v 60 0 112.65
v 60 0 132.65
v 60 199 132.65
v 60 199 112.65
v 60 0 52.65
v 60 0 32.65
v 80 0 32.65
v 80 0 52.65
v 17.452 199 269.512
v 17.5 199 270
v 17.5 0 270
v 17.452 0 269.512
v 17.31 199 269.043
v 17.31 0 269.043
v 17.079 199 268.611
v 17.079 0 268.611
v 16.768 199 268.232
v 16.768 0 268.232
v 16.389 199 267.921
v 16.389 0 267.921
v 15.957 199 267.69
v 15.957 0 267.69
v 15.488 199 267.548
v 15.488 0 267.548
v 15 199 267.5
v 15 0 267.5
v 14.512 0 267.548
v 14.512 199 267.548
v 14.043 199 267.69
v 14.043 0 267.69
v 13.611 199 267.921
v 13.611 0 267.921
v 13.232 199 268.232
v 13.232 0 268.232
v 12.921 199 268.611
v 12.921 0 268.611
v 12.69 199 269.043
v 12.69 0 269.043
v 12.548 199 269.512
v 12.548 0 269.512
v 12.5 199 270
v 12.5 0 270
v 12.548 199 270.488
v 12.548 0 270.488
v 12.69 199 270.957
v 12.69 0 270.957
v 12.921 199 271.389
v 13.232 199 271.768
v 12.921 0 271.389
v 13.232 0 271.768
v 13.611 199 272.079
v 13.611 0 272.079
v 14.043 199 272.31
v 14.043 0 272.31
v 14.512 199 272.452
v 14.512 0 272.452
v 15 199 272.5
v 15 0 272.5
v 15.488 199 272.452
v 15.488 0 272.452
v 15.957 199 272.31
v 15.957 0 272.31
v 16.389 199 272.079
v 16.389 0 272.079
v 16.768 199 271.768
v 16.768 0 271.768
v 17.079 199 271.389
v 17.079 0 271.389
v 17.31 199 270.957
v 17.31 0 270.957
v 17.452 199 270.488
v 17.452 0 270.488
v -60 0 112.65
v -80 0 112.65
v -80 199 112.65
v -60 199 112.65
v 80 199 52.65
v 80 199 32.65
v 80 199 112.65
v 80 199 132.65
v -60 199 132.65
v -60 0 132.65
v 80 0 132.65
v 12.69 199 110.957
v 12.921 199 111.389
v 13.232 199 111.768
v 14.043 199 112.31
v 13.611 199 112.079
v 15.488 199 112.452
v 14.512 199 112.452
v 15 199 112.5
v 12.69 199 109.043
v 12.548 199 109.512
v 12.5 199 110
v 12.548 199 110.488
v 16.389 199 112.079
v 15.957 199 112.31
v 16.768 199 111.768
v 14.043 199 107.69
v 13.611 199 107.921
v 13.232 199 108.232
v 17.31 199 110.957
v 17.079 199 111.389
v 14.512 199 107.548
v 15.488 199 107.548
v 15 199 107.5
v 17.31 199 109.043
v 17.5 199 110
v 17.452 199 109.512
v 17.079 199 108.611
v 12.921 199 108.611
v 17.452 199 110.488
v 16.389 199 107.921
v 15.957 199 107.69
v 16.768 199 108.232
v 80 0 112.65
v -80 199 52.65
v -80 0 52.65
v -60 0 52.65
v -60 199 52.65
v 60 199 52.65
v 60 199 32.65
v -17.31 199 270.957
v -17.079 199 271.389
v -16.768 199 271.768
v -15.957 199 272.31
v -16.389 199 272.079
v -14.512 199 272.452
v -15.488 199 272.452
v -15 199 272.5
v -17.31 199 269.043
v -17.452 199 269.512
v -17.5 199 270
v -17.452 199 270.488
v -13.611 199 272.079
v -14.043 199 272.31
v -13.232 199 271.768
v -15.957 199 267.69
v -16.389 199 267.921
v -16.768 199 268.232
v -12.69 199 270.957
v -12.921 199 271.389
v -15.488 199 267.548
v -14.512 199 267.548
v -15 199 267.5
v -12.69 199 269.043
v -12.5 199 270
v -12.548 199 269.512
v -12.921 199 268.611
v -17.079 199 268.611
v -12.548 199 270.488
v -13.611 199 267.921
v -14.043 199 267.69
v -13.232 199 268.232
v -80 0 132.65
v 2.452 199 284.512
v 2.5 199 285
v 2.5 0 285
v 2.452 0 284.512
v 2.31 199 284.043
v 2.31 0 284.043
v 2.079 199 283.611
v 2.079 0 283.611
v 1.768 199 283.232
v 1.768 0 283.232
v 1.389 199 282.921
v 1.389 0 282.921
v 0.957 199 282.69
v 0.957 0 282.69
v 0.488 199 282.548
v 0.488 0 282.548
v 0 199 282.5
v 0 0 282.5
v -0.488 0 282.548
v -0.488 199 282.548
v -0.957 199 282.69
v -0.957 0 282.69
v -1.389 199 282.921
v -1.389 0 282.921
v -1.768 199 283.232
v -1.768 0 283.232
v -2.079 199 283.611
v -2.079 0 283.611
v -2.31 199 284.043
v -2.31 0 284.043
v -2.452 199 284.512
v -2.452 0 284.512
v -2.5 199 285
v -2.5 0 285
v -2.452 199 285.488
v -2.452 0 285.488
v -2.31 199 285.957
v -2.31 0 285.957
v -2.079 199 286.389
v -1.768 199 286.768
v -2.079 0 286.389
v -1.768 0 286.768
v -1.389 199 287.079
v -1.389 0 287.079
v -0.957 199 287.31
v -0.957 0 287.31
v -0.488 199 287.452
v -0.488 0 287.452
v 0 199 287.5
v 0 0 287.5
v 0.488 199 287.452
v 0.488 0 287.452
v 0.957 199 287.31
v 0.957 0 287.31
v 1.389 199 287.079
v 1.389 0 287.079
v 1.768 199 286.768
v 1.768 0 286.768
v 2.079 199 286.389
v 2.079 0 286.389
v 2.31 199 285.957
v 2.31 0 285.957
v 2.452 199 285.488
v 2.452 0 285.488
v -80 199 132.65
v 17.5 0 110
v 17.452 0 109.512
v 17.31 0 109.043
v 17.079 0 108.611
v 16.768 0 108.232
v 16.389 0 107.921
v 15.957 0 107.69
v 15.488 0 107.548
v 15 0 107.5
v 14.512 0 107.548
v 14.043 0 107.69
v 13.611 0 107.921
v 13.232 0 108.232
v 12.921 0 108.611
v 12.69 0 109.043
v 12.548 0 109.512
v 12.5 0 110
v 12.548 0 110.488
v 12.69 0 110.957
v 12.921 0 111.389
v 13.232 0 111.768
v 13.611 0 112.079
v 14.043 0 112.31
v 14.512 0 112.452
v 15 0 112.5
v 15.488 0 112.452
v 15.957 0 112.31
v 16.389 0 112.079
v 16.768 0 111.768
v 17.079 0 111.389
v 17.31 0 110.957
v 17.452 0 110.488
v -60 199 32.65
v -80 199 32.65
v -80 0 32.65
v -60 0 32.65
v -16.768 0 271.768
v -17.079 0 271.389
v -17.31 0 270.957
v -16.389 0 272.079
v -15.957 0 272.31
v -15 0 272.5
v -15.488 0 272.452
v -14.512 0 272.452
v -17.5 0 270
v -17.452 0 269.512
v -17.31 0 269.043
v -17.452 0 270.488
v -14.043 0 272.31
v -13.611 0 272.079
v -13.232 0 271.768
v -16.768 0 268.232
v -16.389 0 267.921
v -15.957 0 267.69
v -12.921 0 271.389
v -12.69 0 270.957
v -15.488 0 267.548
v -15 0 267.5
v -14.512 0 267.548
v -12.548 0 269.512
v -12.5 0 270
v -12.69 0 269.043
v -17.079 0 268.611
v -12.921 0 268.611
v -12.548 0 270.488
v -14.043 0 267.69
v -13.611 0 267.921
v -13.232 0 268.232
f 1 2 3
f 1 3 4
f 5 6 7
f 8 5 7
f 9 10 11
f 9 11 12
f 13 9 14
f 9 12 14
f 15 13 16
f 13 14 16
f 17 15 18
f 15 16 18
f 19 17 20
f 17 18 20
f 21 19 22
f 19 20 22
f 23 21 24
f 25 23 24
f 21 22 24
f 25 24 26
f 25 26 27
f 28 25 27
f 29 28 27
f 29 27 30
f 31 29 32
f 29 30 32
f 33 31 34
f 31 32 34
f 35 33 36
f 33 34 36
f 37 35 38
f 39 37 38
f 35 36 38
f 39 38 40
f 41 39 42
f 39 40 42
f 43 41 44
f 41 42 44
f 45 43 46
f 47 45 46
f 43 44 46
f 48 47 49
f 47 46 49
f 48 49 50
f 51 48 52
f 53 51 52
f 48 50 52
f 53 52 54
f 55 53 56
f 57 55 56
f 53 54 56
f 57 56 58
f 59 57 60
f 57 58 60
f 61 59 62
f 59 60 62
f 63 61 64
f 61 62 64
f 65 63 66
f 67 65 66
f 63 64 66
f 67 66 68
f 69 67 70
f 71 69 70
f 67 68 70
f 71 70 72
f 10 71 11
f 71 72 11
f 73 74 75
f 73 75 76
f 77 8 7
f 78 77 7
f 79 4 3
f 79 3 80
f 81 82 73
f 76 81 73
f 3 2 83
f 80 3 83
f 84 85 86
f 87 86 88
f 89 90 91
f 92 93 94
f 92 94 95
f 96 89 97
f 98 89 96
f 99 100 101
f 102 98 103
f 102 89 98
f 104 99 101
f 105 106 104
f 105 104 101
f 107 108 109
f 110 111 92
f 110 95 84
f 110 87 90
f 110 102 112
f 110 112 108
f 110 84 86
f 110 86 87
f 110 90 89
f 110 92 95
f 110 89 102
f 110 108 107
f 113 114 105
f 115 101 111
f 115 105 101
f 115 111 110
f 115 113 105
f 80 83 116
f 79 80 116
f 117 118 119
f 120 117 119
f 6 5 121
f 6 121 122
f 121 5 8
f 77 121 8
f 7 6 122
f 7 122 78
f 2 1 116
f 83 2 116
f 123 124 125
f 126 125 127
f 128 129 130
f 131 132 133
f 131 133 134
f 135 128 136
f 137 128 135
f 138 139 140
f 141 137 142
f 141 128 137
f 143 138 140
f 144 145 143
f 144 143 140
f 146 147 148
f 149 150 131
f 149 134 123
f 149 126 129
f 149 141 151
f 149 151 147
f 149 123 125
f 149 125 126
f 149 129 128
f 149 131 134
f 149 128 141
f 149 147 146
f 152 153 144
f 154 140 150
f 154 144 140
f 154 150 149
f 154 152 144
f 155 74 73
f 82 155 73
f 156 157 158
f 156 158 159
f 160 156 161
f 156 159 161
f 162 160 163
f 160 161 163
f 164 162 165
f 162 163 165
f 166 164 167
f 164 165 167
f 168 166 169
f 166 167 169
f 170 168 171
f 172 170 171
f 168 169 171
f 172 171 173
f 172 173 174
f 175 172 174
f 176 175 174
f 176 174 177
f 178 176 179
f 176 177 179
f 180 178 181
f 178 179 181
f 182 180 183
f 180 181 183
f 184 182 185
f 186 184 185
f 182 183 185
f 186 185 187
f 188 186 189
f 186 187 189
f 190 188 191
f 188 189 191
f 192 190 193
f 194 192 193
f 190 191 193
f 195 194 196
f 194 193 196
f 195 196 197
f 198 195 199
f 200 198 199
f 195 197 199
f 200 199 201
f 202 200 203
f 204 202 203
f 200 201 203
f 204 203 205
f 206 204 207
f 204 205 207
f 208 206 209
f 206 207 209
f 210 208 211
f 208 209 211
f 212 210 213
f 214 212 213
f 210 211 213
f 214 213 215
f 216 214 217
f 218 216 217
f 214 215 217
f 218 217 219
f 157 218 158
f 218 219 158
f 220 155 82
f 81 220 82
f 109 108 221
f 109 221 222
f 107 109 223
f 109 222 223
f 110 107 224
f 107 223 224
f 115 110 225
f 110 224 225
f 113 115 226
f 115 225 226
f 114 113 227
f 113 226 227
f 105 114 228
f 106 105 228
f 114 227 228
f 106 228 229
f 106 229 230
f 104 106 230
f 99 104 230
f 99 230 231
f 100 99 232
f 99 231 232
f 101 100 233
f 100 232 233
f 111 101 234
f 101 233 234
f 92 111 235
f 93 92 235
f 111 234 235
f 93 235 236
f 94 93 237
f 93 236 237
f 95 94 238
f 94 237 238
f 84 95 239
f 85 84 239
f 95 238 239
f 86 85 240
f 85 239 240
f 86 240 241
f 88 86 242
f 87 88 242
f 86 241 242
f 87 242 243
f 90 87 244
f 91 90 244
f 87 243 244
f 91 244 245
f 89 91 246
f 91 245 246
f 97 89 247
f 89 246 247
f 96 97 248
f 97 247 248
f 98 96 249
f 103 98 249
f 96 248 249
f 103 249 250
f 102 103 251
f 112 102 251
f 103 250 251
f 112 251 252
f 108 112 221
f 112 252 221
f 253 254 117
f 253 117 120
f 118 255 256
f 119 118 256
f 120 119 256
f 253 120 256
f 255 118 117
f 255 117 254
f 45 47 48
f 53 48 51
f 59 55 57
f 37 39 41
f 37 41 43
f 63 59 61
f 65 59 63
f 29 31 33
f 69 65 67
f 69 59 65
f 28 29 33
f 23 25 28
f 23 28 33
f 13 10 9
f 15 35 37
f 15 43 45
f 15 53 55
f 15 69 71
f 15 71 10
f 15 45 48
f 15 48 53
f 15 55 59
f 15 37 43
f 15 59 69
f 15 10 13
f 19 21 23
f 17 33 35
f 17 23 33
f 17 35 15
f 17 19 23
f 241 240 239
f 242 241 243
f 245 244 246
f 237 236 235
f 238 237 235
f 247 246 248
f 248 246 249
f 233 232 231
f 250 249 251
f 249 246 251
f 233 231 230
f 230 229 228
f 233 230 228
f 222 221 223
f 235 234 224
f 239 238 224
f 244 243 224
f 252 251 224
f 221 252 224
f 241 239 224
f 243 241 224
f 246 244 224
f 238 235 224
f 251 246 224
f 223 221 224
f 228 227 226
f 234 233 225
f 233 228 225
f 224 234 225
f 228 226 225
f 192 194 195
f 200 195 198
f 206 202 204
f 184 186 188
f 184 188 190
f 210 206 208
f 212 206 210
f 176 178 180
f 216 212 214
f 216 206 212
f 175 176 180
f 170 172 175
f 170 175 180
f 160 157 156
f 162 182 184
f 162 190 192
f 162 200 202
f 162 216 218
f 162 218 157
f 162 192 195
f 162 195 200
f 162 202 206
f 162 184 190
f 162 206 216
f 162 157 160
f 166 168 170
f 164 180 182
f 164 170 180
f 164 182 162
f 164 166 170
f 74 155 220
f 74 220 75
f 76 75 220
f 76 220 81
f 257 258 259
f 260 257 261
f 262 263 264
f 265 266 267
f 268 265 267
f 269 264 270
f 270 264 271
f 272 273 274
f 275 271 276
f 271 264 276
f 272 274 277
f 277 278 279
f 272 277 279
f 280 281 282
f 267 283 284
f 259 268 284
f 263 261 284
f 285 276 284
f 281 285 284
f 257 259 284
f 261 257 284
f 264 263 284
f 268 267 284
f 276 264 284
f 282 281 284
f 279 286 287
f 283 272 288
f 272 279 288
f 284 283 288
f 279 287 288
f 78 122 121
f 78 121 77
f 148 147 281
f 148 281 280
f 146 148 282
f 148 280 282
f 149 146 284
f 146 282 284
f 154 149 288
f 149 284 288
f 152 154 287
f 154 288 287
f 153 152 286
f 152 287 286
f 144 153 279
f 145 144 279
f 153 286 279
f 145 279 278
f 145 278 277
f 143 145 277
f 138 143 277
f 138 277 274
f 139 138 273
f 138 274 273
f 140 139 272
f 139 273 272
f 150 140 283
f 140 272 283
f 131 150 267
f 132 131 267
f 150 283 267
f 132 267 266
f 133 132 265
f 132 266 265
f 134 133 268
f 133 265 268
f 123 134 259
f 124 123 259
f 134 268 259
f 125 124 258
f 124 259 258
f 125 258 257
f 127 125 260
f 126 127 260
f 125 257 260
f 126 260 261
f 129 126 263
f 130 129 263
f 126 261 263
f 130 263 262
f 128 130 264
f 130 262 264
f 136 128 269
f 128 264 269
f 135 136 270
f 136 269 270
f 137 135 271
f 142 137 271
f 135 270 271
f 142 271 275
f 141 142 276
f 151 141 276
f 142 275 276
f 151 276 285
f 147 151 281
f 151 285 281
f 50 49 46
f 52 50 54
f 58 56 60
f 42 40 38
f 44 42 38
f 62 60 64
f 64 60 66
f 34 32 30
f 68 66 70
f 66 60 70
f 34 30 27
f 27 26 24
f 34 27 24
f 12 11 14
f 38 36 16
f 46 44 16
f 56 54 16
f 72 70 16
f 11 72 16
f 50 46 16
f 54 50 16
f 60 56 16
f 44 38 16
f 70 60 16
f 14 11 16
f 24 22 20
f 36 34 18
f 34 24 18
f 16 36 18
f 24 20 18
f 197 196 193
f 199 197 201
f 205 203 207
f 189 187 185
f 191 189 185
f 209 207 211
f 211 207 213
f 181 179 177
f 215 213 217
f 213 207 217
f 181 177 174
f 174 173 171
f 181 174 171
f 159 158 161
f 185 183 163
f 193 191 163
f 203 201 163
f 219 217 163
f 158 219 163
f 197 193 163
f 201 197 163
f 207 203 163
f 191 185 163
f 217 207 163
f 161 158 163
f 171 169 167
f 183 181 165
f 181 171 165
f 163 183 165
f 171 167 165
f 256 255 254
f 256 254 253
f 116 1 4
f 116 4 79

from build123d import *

# Parameters (mm, degrees)
SKIZZE3_R                         = 2.5
AUFSATZ_LINEAR_AUSTRAGEN1_DEPTH   = 199
AUFSATZ_LINEAR_AUSTRAGEN1_2_DEPTH = 199
AUFSATZ_LINEAR_AUSTRAGEN1_3_DEPTH = 199
AUFSATZ_LINEAR_AUSTRAGEN1_4_DEPTH = 199
SKIZZE3_W                         = 20
SKIZZE3_H                         = 20
AUFSATZ_LINEAR_AUSTRAGEN1_5_DEPTH = 199
AUFSATZ_LINEAR_AUSTRAGEN1_6_DEPTH = 199
AUFSATZ_LINEAR_AUSTRAGEN1_7_DEPTH = 199
AUFSATZ_LINEAR_AUSTRAGEN1_8_DEPTH = 199


with BuildPart() as part:
    # Skizze3 → Aufsatz-Linear austragen1 (new body)
    with BuildSketch(Plane(origin=(0, 0, 0), x_dir=(1, 0, 0), z_dir=(0, 1, 0))):
        with Locations((15, -110)):
            Circle(SKIZZE3_R)
    extrude(amount=AUFSATZ_LINEAR_AUSTRAGEN1_DEPTH)


with BuildPart() as body_2:
    # Skizze3 → Aufsatz-Linear austragen1 2 (new body)
    with BuildSketch(Plane(origin=(0, 0, 0), x_dir=(1, 0, 0), z_dir=(0, 1, 0))):
        with Locations((-15, -270)):
            Circle(SKIZZE3_R)
    extrude(amount=AUFSATZ_LINEAR_AUSTRAGEN1_2_DEPTH)


with BuildPart() as body_3:
    # Skizze3 → Aufsatz-Linear austragen1 3 (new body)
    with BuildSketch(Plane(origin=(0, 0, 0), x_dir=(1, 0, 0), z_dir=(0, 1, 0))):
        with Locations((0, -285)):
            Circle(SKIZZE3_R)
    extrude(amount=AUFSATZ_LINEAR_AUSTRAGEN1_3_DEPTH)


with BuildPart() as body_4:
    # Skizze3 → Aufsatz-Linear austragen1 4 (new body)
    with BuildSketch(Plane(origin=(0, 0, 0), x_dir=(1, 0, 0), z_dir=(0, 1, 0))):
        with Locations((15, -270)):
            Circle(SKIZZE3_R)
    extrude(amount=AUFSATZ_LINEAR_AUSTRAGEN1_4_DEPTH)


with BuildPart() as body_5:
    # Skizze3 → Aufsatz-Linear austragen1 5 (new body)
    with BuildSketch(Plane(origin=(0, 0, 0), x_dir=(1, 0, 0), z_dir=(0, 1, 0))):
        with Locations((-70, -42.65)):
            Rectangle(SKIZZE3_W, SKIZZE3_H)
    extrude(amount=AUFSATZ_LINEAR_AUSTRAGEN1_5_DEPTH)


with BuildPart() as body_6:
    # Skizze3 → Aufsatz-Linear austragen1 6 (new body)
    with BuildSketch(Plane(origin=(0, 0, 0), x_dir=(1, 0, 0), z_dir=(0, 1, 0))):
        with Locations((70, -42.65)):
            Rectangle(SKIZZE3_W, SKIZZE3_H)
    extrude(amount=AUFSATZ_LINEAR_AUSTRAGEN1_6_DEPTH)


with BuildPart() as body_7:
    # Skizze3 → Aufsatz-Linear austragen1 7 (new body)
    with BuildSketch(Plane(origin=(0, 0, 0), x_dir=(1, 0, 0), z_dir=(0, 1, 0))):
        with Locations((70, -122.65)):
            Rectangle(SKIZZE3_W, SKIZZE3_H)
    extrude(amount=AUFSATZ_LINEAR_AUSTRAGEN1_7_DEPTH)


with BuildPart() as body_8:
    # Skizze3 → Aufsatz-Linear austragen1 8 (new body)
    with BuildSketch(Plane(origin=(0, 0, 0), x_dir=(1, 0, 0), z_dir=(0, 1, 0))):
        with Locations((-70, -122.65)):
            Rectangle(SKIZZE3_W, SKIZZE3_H)
    extrude(amount=AUFSATZ_LINEAR_AUSTRAGEN1_8_DEPTH)


solid = Compound([part.part, body_2.part, body_3.part, body_4.part, body_5.part, body_6.part, body_7.part, body_8.part])
